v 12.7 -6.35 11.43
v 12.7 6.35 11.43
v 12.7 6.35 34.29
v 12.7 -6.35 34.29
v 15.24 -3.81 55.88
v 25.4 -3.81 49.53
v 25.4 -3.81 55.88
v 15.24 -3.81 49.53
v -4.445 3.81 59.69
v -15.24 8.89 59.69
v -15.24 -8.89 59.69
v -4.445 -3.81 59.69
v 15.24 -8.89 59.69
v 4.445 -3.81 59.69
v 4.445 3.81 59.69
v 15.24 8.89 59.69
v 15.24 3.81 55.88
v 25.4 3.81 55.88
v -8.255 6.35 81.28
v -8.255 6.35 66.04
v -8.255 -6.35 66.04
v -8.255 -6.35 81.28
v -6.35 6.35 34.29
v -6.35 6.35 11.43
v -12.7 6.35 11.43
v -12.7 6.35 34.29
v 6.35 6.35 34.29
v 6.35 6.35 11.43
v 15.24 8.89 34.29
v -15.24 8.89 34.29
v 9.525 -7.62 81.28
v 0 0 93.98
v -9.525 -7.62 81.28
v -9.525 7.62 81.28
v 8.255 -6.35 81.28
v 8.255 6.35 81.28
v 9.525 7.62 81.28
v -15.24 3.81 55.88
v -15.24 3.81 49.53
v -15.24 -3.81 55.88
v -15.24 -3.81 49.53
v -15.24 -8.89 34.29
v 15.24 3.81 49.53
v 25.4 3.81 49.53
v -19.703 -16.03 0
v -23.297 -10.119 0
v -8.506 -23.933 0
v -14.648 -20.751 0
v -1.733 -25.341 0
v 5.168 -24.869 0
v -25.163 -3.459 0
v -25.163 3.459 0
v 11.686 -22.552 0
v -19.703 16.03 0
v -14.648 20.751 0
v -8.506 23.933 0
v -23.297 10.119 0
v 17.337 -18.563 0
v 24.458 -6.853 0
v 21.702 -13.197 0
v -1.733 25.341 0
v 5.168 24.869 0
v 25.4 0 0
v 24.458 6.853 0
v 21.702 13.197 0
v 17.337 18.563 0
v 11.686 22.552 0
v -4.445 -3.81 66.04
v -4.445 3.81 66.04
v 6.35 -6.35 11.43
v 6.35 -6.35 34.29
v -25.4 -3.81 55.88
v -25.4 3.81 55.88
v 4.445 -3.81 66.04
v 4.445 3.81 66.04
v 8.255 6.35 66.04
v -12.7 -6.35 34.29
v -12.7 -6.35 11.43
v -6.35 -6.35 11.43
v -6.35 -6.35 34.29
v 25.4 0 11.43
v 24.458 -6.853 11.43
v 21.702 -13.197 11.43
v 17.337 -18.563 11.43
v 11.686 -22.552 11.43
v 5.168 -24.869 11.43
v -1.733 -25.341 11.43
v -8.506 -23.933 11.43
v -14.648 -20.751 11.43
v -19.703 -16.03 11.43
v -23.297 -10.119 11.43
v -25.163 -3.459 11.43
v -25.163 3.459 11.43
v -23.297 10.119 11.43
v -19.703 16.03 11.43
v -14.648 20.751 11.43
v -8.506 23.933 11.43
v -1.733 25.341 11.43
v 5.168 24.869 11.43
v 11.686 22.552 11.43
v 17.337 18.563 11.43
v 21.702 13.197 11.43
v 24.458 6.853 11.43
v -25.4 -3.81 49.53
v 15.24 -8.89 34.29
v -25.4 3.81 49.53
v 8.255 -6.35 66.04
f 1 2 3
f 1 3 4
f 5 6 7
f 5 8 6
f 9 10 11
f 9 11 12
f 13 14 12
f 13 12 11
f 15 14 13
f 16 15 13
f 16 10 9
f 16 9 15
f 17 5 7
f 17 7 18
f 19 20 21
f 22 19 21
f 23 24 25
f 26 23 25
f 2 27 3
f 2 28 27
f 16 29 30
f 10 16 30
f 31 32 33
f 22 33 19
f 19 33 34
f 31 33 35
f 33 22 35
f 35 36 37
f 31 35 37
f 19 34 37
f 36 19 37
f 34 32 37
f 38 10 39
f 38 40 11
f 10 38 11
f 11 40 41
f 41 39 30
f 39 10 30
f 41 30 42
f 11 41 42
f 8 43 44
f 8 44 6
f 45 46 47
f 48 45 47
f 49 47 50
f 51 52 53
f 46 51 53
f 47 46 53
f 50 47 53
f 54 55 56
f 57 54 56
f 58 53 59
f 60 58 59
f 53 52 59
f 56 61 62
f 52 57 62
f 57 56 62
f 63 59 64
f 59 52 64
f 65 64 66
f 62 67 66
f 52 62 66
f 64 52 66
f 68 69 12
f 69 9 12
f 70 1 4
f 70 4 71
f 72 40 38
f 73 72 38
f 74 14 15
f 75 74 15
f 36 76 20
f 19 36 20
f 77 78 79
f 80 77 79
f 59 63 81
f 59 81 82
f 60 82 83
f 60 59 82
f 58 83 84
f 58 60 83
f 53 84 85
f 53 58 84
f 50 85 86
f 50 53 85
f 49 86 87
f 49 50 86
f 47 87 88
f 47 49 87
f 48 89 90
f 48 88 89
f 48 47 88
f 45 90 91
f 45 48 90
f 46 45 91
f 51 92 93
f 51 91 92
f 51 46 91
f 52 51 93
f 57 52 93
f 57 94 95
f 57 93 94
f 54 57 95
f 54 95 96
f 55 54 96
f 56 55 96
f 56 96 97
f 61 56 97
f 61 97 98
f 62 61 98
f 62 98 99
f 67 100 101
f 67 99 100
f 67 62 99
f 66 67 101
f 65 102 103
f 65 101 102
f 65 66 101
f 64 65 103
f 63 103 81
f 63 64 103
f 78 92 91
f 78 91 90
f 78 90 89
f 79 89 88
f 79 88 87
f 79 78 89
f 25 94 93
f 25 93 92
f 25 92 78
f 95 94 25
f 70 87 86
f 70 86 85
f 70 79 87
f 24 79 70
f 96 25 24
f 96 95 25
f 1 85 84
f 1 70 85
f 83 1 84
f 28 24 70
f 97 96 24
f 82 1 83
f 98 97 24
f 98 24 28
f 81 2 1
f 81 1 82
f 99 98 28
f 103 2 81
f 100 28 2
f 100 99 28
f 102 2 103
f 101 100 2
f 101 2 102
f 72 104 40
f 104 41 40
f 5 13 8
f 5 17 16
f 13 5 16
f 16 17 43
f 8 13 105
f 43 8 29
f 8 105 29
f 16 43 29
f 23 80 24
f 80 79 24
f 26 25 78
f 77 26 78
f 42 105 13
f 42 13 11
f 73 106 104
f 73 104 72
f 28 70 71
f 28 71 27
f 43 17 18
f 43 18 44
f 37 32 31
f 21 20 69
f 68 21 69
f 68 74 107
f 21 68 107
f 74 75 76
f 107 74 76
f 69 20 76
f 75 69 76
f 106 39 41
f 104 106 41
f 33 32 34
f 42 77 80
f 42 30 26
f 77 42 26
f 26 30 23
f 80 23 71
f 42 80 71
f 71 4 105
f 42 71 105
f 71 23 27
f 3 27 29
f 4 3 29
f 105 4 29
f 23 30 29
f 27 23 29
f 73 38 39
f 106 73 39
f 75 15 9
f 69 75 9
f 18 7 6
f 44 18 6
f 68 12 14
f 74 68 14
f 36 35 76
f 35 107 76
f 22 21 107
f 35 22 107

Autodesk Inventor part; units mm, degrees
ref_plane "YZ Plane" through (0, 0, 0) normal (1, 0, 0) x (0, 1, 0)
ref_plane "XZ Plane" through (0, 0, 0) normal (0, 1, 0) x (-1, 0, 0)
ref_plane "XY Plane" through (0, 0, 0) normal (0, 0, 1) x (1, 0, 0)
sketch "Sketch1" plane through (0, 0, 0) normal (0, 0, 1) x (1, 0, 0)
  circle A0 centre (0, 0) radius 25.4
  dimension "d0" = 50.8
extrude "Extrusion1" add sketch "Sketch1" along normal blind 11.43
sketch "Sketch2" plane through (0, 0, 11.43) normal (0, 0, 1) x (1, 0, 0)
  line L0 (0, 0) -> (-6.35, 0)
  line L1 (0, 0) -> (6.35, 0)
  line L2 (-6.35, 0) -> (-6.35, 6.35)
  line L3 (-6.35, 6.35) -> (-12.7, 6.35)
  line L4 (-12.7, 6.35) -> (-12.7, -6.35)
  line L5 (-12.7, -6.35) -> (-6.35, -6.35)
  line L6 (-6.35, -6.35) -> (-6.35, 0)
  line L7 (6.35, 0) -> (6.35, 6.35)
  line L8 (6.35, 6.35) -> (12.7, 6.35)
  line L9 (12.7, 6.35) -> (12.7, -6.35)
  line L10 (12.7, -6.35) -> (6.35, -6.35)
  line L11 (6.35, -6.35) -> (6.35, 0)
  dimension "d3" = 6.35
  dimension "d4" = 6.35
  dimension "d5" = 6.35
  dimension "d6" = 6.35
  dimension "d7" = 12.7
  dimension "d8" = 6.35
  dimension "d9" = 6.35
  dimension "d10" = 12.7
extrude "Extrusion2" add sketch "Sketch2" along normal blind 22.86
sketch "Sketch3" plane through (0, 0, 34.29) normal (0, 0, 1) x (1, 0, 0)
  line L0 (-12.7, 6.35) -> (-12.7, -6.35) projected
  line L1 (-12.7, -6.35) -> (-12.7, -8.89)
  line L2 (-12.7, -8.89) -> (-15.24, -8.89)
  line L3 (-15.24, -8.89) -> (15.24, -8.89)
  line L4 (15.24, -8.89) -> (15.24, 8.89)
  line L5 (15.24, 8.89) -> (-15.24, 8.89)
  line L6 (-15.24, 8.89) -> (-15.24, -8.89)
  point P0 (0, 0)
  dimension "d13" = 2.54
  dimension "d14" = 2.54
  dimension "d15" = 30.48
  dimension "d16" = 17.78
extrude "Extrusion3" add sketch "Sketch3" along normal blind 25.4
sketch "Sketch4" plane through (-15.24, -8.89, 34.29) normal (-1, 0, 0) x (0, 0, 1)
  line L0 (0, 17.78) -> (25.4, 17.78) projected
  line L1 (0, 17.78) -> (0, 12.7)
  line L2 (0, 0) -> (0, 17.78) projected
  line L3 (0, 12.7) -> (15.24, 12.7)
  line L4 (15.24, 12.7) -> (15.24, 5.08)
  line L5 (15.24, 5.08) -> (21.59, 5.08)
  line L6 (21.59, 5.08) -> (21.59, 12.7)
  line L7 (21.59, 12.7) -> (15.24, 12.7)
  point P0 (-34.29, 8.89)
  dimension "d19" = 5.08
  dimension "d20" = 15.24
  dimension "d21" = 7.62
  dimension "d22" = 6.35
  dimension "d23" = 7.62
extrude "Extrusion4" add sketch "Sketch4" along normal blind 10.16
sketch "Sketch5" plane through (15.24, -8.89, 34.29) normal (1, 0, 0) x (0, 0, -1)
  line L0 (0, 0) -> (0, 5.08)
  line L1 (0, 17.78) -> (0, 0) projected
  line L2 (0, 5.08) -> (-15.24, 5.08)
  line L3 (-15.24, 5.08) -> (-21.59, 5.08)
  line L4 (-21.59, 5.08) -> (-21.59, 12.7)
  line L5 (-21.59, 12.7) -> (-15.24, 12.7)
  line L6 (-15.24, 12.7) -> (-15.24, 5.08)
  point P0 (34.29, 8.89)
  dimension "d26" = 5.08
  dimension "d27" = 15.24
  dimension "d28" = 6.35
  dimension "d29" = 7.62
extrude "Extrusion5" add sketch "Sketch5" along normal blind 10.16
sketch "Sketch6" plane through (0, 0, 59.69) normal (0, 0, 1) x (1, 0, 0)
  line L0 (-15.24, -8.89) -> (15.24, -8.89) projected
  line L1 (15.24, -8.89) -> (4.445, -8.89)
  line L2 (-15.24, 8.89) -> (-15.24, -8.89) projected
  line L3 (-15.24, -8.89) -> (-4.445, -8.89)
  line L4 (-4.445, -8.89) -> (-4.445, -3.81)
  line L5 (15.24, 8.89) -> (-15.24, 8.89) projected
  line L6 (-4.445, -3.81) -> (4.445, -3.81)
  line L7 (4.445, -3.81) -> (4.445, 3.81)
  line L8 (4.445, 3.81) -> (-4.445, 3.81)
  line L9 (-4.445, 3.81) -> (-4.445, -3.81)
  point P0 (0, 0)
  dimension "d32" = 10.795
  dimension "d33" = 10.795
  dimension "d34" = 5.08
  dimension "d35" = 7.62
extrude "Extrusion6" add sketch "Sketch6" along normal blind 6.35
sketch "Sketch7" plane through (0, 0, 66.04) normal (0, 0, 1) x (1, 0, 0)
  line L0 (4.445, 3.81) -> (4.445, -3.81) projected
  line L1 (4.445, 3.81) -> (8.255, 3.81)
  line L2 (8.255, 3.81) -> (8.255, 6.35)
  line L3 (12.7, 6.35) -> (6.35, 6.35) projected
  line L4 (-12.7, -6.35) -> (-6.35, -6.35) projected
  line L5 (8.255, 6.35) -> (-8.255, 6.35)
  line L6 (-8.255, 6.35) -> (-8.255, -6.35)
  line L7 (-8.255, -6.35) -> (8.255, -6.35)
  line L8 (8.255, -6.35) -> (8.255, 6.35)
  point P0 (0, 0)
  dimension "d38" = 3.81
  dimension "d39" = 16.51
extrude "Extrusion7" add sketch "Sketch7" along normal blind 15.24
sketch "Sketch8" plane through (0, 0, 81.28) normal (0, 0, 1) x (1, 0, 0)
  line L0 (-8.255, 6.35) -> (-8.255, -6.35) projected
  line L1 (-8.255, -6.35) -> (-8.255, -7.62)
  line L2 (-8.255, -7.62) -> (-9.525, -7.62)
  line L3 (-9.525, -7.62) -> (9.525, -7.62)
  line L4 (9.525, -7.62) -> (9.525, 7.62)
  line L5 (9.525, 7.62) -> (-9.525, 7.62)
  line L6 (-9.525, 7.62) -> (-9.525, -7.62)
  point P0 (0, 0)
  dimension "d42" = 1.27
  dimension "d43" = 1.27
  dimension "d44" = 15.24
extrude "Extrusion8" add sketch "Sketch8" along normal blind 12.7
sketch "Sketch9" plane through (-9.525, 7.62, 81.28) normal (0, 1, 0) x (1, 0, 0)
  line L0 (19.05, 0) -> (0, 0) projected
  line L1 (19.05, 0) -> (19.05, -12.7)
  line L2 (19.05, -12.7) -> (9.525, -12.7)
  line L3 (19.05, -12.7) -> (0, -12.7) projected
  line L4 (9.525, -12.7) -> (19.05, 0)
  line L5 (9.525, -12.7) -> (0, -12.7)
  line L6 (0, 0) -> (0, -12.7) projected
  line L7 (0, 0) -> (0, -12.7)
  line L8 (9.525, -12.7) -> (0, 0)
  point P0 (9.525, 81.28)
sketch "Sketch10" plane through (-9.525, -7.62, 81.28) normal (-1, 0, 0) x (0, 0, 1)
  line L0 (12.7, 0) -> (12.7, 15.24) projected
  line L1 (12.7, 15.24) -> (12.7, 7.62)
  line L2 (0, 0) -> (0, 15.24) projected
  line L3 (12.7, 7.62) -> (0, 15.24)
  line L4 (0, 15.24) -> (12.7, 15.24)
  line L5 (0, 0) -> (12.7, 0) projected
  line L6 (12.7, 0) -> (12.7, 7.62)
  line L7 (12.7, 7.62) -> (0, 0)
  line L8 (12.7, 0) -> (0, 0)
  point P0 (-81.28, 7.62)
  dimension "d47" = 7.62
extrude "Extrusion9" cut sketch "Sketch9" against normal blind 15.24 contours L1 L2 L4 | L8 L3 L6
extrude "Extrusion10" cut sketch "Sketch10" against normal blind 20.32 contours L5 L7 L0 | L3 L4 L0
properties part number "Vasile5-6Bridge.stl"
